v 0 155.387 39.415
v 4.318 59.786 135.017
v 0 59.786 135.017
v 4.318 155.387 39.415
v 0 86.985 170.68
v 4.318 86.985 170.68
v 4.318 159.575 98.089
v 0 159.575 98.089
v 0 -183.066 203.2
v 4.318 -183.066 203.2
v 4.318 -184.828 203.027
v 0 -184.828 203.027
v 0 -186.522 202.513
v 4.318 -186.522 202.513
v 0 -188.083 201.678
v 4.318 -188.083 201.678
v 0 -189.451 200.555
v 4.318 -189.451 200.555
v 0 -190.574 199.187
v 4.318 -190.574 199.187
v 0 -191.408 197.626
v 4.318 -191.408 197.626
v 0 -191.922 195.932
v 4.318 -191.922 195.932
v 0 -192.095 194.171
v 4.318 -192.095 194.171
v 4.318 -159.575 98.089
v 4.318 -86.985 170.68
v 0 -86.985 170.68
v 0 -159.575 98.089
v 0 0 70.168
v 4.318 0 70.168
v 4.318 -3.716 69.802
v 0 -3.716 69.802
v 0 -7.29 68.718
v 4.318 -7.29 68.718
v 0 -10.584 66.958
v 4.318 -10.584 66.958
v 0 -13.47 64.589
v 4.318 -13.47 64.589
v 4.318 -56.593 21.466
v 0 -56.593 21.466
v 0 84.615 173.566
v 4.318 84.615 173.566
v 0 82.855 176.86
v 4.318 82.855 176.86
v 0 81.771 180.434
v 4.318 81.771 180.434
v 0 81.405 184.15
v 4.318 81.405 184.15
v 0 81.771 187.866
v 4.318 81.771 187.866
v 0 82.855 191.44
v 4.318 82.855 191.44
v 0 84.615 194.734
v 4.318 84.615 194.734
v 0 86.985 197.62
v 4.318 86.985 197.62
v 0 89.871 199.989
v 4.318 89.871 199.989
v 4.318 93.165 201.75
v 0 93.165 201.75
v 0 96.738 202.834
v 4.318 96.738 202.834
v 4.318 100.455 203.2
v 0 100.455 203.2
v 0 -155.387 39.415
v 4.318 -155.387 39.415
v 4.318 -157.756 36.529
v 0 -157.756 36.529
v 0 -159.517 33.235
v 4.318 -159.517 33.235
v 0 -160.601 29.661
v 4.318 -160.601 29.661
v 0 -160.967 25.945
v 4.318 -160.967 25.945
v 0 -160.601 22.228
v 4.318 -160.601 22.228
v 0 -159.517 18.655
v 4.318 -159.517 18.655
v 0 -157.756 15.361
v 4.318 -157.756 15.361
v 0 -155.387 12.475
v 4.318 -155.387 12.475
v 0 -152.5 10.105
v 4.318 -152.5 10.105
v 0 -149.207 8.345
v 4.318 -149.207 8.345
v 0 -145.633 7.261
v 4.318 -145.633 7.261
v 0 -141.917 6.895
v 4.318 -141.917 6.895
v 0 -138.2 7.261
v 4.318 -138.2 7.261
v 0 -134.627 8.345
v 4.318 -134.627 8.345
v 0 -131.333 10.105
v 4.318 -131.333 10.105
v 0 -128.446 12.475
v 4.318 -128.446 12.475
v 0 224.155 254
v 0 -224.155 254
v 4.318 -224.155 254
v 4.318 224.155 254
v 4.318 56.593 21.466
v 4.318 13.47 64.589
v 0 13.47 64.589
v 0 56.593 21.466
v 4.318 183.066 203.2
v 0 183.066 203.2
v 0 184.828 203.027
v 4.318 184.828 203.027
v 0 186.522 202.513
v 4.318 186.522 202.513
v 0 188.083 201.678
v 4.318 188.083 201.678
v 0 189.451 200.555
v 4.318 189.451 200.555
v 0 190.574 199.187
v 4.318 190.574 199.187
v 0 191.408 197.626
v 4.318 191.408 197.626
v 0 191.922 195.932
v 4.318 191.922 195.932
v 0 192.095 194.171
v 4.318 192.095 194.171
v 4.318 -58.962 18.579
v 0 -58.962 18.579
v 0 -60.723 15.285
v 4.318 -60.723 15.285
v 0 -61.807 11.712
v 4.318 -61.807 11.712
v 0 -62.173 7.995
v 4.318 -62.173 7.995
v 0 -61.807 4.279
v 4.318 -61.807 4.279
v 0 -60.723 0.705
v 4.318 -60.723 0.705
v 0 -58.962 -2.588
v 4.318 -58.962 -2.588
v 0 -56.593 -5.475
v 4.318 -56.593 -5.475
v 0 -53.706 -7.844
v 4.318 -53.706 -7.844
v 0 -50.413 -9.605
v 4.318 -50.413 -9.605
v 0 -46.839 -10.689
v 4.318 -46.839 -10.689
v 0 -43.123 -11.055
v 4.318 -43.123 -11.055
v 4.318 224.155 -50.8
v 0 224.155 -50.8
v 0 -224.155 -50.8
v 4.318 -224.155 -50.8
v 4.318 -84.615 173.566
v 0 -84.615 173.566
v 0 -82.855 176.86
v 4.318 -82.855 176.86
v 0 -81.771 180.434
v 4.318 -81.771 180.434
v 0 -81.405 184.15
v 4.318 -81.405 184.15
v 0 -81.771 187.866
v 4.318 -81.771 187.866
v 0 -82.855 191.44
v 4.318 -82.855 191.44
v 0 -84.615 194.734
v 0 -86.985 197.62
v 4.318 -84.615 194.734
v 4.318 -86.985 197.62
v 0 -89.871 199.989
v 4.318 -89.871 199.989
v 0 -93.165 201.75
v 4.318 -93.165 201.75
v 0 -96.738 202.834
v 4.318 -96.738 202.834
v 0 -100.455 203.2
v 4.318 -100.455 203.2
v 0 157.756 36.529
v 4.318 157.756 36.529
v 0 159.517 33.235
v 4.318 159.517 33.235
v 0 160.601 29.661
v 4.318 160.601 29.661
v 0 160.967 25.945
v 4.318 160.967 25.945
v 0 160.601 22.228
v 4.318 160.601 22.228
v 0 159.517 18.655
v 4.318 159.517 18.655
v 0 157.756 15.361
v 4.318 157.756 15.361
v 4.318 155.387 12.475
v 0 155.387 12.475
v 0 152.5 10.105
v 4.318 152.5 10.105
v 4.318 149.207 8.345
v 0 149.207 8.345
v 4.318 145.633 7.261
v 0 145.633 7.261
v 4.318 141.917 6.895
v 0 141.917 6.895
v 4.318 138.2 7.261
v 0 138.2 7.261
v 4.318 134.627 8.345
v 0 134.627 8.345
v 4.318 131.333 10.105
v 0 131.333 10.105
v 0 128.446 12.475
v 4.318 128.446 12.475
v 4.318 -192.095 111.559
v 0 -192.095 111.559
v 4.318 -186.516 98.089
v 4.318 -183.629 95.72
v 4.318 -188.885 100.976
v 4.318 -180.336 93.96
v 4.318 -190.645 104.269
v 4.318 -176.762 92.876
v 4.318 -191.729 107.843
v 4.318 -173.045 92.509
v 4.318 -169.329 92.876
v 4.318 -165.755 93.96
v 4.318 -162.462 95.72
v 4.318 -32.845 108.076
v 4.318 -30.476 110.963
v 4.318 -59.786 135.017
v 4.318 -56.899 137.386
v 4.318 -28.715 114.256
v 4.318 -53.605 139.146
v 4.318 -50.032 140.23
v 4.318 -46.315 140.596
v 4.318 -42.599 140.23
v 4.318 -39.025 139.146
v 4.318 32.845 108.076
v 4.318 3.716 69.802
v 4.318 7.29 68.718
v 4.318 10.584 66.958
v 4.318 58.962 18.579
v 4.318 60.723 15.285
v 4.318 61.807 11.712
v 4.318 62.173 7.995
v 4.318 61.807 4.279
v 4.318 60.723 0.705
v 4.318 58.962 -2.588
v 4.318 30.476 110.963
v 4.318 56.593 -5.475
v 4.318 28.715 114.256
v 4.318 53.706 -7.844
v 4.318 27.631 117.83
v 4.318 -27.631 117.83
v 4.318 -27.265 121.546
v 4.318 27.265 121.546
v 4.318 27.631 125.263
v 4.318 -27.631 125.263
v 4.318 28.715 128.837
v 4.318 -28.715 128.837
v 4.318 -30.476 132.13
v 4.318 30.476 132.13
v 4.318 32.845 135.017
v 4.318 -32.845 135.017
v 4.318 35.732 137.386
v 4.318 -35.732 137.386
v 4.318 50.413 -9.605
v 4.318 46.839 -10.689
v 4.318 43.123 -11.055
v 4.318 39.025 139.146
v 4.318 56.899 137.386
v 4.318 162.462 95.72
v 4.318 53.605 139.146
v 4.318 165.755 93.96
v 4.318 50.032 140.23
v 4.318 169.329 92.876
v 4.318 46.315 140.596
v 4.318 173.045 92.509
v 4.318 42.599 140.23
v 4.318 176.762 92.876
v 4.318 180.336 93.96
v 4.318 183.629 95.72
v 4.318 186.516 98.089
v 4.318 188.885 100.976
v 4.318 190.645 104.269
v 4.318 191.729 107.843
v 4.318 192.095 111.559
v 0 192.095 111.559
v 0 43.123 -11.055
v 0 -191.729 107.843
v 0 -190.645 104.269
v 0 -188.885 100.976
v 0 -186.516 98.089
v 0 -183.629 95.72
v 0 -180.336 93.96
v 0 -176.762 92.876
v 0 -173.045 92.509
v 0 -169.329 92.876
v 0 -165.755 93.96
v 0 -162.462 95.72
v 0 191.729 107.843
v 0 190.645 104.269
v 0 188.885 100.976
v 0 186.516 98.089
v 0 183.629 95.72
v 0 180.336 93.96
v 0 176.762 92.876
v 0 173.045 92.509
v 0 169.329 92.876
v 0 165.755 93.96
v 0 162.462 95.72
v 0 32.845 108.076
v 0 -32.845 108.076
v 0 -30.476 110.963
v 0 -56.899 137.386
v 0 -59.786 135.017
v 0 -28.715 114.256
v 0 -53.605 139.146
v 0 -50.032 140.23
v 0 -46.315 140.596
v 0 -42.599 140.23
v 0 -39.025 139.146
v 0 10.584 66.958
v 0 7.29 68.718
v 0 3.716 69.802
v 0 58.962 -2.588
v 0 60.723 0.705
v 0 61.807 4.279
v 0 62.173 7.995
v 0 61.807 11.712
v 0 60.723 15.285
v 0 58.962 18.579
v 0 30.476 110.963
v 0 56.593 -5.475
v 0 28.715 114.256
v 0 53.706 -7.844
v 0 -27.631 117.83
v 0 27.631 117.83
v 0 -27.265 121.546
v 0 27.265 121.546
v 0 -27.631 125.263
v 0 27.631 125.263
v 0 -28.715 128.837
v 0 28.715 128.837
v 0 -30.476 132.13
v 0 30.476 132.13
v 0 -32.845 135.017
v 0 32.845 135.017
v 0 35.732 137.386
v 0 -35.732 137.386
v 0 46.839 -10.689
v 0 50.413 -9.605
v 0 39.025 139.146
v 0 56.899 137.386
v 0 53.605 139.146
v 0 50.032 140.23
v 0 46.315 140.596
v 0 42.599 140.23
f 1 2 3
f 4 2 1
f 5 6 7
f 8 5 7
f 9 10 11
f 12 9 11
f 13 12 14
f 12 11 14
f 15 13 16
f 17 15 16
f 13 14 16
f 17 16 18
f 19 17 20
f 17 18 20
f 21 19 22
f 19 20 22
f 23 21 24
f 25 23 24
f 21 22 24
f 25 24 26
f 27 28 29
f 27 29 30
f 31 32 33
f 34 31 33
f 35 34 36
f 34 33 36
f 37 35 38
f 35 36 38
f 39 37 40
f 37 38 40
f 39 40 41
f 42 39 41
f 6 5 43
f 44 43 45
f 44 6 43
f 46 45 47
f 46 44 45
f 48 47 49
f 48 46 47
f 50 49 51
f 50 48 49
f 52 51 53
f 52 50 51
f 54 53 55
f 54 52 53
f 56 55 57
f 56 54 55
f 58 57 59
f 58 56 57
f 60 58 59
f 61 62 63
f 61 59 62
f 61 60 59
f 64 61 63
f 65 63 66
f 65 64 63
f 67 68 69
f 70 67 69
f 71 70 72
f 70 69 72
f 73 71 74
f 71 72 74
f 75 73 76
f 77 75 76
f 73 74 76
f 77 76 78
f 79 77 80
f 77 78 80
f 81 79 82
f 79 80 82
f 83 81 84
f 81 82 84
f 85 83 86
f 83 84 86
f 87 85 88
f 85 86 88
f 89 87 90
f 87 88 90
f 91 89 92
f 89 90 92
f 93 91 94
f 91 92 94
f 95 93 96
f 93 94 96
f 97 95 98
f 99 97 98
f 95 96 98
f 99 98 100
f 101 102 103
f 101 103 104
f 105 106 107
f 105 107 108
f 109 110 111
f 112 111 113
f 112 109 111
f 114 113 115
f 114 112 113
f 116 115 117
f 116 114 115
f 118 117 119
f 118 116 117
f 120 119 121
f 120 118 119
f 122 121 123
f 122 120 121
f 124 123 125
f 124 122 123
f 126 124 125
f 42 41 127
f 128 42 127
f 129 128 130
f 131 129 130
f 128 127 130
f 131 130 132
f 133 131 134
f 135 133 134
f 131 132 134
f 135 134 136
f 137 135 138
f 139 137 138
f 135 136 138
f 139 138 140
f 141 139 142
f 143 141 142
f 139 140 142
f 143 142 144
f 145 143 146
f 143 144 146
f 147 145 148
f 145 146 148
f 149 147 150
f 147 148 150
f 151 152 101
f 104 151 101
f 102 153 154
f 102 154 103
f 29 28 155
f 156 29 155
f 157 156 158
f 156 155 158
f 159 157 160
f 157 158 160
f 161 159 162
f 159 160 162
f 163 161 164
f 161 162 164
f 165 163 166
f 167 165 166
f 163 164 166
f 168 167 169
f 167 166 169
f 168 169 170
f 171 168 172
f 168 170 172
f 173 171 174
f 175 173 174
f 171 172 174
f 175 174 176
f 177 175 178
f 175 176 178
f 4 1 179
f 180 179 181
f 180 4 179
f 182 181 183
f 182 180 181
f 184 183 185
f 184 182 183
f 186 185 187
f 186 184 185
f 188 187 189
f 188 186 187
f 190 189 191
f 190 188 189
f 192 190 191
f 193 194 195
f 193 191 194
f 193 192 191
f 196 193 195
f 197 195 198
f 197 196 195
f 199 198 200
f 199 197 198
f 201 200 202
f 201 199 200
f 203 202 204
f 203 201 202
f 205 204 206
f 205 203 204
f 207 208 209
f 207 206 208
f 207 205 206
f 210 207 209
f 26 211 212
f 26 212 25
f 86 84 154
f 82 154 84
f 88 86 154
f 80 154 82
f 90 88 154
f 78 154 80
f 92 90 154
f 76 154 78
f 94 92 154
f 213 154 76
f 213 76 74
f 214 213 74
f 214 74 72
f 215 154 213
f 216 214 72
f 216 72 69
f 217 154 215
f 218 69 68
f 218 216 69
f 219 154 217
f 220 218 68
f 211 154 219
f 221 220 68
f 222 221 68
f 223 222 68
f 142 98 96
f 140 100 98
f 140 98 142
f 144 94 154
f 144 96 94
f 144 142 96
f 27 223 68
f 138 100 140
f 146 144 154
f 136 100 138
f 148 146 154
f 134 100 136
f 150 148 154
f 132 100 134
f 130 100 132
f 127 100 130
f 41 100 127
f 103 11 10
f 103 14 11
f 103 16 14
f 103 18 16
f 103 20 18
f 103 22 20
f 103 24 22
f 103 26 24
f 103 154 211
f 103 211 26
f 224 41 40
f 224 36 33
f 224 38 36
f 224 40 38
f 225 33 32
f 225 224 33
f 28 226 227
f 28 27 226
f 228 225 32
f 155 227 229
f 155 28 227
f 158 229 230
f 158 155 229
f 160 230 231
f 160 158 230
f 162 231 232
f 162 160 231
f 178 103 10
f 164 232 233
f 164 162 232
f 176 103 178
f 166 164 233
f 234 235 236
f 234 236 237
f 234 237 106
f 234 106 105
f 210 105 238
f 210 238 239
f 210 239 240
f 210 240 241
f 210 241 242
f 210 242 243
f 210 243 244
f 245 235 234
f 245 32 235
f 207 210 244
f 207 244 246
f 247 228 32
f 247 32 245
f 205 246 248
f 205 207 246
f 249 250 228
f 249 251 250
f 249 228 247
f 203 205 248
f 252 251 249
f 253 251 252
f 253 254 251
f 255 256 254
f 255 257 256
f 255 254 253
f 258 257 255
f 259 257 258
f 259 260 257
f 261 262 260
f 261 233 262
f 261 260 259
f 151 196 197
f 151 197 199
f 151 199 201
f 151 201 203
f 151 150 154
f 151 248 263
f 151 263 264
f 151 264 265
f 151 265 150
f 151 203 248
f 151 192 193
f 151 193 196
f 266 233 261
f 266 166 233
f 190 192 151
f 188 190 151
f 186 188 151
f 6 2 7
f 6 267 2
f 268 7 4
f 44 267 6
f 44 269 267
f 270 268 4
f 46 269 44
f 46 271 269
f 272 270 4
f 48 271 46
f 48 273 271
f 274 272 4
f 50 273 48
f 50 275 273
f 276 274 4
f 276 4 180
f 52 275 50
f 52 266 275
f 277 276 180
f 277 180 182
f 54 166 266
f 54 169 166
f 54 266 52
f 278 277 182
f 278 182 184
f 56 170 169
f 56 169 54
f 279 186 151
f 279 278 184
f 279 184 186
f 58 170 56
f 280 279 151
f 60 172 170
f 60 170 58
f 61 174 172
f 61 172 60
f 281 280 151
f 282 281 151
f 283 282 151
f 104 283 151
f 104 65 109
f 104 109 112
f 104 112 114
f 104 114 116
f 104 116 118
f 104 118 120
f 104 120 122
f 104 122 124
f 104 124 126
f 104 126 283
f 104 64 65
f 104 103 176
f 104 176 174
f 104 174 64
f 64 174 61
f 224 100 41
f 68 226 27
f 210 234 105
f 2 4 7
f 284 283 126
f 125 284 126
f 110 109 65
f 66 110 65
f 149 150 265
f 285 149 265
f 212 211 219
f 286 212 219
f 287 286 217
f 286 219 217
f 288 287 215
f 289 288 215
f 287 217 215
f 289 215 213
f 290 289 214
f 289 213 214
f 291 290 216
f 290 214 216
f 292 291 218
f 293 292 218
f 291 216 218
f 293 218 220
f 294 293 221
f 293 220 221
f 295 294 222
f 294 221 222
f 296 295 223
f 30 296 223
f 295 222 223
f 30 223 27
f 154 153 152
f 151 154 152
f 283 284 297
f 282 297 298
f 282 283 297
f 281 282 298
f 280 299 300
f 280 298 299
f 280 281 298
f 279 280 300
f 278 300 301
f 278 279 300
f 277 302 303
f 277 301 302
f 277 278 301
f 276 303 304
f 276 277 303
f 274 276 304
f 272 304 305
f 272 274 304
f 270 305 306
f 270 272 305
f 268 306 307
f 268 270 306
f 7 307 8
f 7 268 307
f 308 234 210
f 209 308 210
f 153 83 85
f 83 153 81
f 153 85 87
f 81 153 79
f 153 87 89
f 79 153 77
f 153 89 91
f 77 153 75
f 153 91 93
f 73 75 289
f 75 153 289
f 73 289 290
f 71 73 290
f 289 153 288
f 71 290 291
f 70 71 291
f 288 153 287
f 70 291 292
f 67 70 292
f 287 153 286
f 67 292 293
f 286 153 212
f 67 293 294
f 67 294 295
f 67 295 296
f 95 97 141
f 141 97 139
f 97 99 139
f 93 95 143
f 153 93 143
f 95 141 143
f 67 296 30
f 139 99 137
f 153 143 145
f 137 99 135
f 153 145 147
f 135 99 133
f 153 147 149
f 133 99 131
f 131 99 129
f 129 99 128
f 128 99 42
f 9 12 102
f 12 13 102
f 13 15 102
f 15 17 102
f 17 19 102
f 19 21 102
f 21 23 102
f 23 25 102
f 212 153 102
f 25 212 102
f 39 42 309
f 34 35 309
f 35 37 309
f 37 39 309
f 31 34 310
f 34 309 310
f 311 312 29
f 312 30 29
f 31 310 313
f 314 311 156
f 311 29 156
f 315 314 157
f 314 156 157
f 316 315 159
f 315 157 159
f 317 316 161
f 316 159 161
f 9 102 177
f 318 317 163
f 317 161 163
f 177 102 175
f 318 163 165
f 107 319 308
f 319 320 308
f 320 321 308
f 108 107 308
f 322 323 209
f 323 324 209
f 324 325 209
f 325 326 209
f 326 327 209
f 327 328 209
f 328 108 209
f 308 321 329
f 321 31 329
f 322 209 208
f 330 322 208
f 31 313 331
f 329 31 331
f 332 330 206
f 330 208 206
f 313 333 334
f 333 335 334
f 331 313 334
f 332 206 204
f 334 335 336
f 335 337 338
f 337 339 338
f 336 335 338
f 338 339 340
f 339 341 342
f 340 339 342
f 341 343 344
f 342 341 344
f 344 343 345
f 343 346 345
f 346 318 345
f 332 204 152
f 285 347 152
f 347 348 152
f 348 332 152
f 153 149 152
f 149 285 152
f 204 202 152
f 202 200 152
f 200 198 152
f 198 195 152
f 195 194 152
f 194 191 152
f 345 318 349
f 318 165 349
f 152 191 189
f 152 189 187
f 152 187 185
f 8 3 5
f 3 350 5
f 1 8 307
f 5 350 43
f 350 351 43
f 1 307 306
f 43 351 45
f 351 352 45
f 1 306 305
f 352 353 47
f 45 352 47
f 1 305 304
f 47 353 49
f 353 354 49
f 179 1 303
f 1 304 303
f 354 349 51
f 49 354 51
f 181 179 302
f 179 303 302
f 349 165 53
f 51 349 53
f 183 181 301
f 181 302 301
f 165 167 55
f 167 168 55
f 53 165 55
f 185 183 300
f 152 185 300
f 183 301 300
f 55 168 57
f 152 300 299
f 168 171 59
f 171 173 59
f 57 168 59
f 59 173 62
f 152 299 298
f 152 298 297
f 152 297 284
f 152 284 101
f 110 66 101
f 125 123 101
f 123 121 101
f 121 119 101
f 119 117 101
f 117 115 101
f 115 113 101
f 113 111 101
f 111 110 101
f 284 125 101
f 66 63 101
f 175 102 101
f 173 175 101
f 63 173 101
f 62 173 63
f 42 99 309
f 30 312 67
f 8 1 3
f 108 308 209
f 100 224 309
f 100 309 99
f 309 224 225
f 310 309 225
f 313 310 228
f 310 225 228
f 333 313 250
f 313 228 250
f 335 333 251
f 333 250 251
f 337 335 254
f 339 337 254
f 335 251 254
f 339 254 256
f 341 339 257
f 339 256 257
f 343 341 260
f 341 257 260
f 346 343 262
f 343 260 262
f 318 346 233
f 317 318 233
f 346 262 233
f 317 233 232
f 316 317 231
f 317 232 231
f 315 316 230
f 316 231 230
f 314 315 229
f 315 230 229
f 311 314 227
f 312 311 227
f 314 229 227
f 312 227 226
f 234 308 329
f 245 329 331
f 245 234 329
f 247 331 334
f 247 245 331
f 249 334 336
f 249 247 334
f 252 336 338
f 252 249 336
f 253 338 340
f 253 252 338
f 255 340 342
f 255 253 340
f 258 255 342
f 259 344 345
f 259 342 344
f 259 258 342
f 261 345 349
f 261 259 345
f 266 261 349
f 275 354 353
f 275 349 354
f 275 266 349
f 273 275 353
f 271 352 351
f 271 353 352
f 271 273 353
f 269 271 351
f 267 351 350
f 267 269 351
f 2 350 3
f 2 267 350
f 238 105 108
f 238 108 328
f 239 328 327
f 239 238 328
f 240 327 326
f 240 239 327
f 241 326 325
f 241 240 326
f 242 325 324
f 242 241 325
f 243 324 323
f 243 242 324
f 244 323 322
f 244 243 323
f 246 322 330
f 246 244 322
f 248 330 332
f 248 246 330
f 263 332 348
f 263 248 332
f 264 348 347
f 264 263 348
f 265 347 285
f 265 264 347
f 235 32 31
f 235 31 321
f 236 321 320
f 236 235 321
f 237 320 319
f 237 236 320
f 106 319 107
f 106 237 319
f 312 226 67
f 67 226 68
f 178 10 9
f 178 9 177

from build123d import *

# Parameters (mm, degrees)
SKETCH001_W  = 448.31
SKETCH001_H  = 304.8
PAD_DEPTH    = 4.318
POCKET_DEPTH = 1088.576426


with BuildPart() as part:
    # Sketch001 → Pad (new body)
    with BuildSketch(Plane.YZ):
        with Locations((0, 101.6)):
            Rectangle(SKETCH001_W, SKETCH001_H)
    extrude(amount=PAD_DEPTH)

    # Sketch (on Face6 of Pad) → Pocket (cut, through all)
    with BuildSketch(Plane.YZ.offset(4.318)):
        with BuildLine():
            ThreePointArc((-32.844781, 108.076032), (-32.844781, 135.0168), (-59.785549, 135.0168))
            Line((-59.785549, 135.0168), (-155.38703, 39.41532))
            ThreePointArc((-155.38703, 39.41532), (-155.38703, 12.474551), (-128.446262, 12.474551))
            Line((-32.844781, 108.076032), (-128.446262, 12.474551))
        make_face()
        with BuildLine():
            Line((-13.470384, 64.588636), (-56.59327, 21.46575))
            ThreePointArc((-56.59327, 21.46575), (-60.722791, 0.705246), (-43.122886, -11.054634))
            Line((-43.122886, -11.054634), (0, -11.054634))
            Line((0, 70.168252), (0, -11.054634))
            ThreePointArc((0, 70.168252), (-7.290119, 68.718157), (-13.470384, 64.588636))
        make_face()
        with BuildLine():
            Line((-183.066243, 203.2), (-100.454911, 203.2))
            ThreePointArc((-86.984527, 170.679616), (-82.855006, 191.440119), (-100.454911, 203.2))
            Line((-86.984527, 170.679616), (-159.575036, 98.089107))
            ThreePointArc((-192.09542, 111.559491), (-180.33554, 93.959586), (-159.575036, 98.089107))
            Line((-192.09542, 111.559491), (-192.09542, 194.170823))
            ThreePointArc((-183.066243, 203.2), (-189.450836, 200.555415), (-192.09542, 194.170823))
        make_face()
    pocket = extrude(amount=-POCKET_DEPTH, mode=Mode.SUBTRACT)

    # Mirrored: Pocket across Sketch V_Axis
    add(pocket.mirror(Plane(origin=(4.318, 0, 0), x_dir=(1, 0, 0), z_dir=(0, 1, 0))), mode=Mode.SUBTRACT)


solid = part.part
